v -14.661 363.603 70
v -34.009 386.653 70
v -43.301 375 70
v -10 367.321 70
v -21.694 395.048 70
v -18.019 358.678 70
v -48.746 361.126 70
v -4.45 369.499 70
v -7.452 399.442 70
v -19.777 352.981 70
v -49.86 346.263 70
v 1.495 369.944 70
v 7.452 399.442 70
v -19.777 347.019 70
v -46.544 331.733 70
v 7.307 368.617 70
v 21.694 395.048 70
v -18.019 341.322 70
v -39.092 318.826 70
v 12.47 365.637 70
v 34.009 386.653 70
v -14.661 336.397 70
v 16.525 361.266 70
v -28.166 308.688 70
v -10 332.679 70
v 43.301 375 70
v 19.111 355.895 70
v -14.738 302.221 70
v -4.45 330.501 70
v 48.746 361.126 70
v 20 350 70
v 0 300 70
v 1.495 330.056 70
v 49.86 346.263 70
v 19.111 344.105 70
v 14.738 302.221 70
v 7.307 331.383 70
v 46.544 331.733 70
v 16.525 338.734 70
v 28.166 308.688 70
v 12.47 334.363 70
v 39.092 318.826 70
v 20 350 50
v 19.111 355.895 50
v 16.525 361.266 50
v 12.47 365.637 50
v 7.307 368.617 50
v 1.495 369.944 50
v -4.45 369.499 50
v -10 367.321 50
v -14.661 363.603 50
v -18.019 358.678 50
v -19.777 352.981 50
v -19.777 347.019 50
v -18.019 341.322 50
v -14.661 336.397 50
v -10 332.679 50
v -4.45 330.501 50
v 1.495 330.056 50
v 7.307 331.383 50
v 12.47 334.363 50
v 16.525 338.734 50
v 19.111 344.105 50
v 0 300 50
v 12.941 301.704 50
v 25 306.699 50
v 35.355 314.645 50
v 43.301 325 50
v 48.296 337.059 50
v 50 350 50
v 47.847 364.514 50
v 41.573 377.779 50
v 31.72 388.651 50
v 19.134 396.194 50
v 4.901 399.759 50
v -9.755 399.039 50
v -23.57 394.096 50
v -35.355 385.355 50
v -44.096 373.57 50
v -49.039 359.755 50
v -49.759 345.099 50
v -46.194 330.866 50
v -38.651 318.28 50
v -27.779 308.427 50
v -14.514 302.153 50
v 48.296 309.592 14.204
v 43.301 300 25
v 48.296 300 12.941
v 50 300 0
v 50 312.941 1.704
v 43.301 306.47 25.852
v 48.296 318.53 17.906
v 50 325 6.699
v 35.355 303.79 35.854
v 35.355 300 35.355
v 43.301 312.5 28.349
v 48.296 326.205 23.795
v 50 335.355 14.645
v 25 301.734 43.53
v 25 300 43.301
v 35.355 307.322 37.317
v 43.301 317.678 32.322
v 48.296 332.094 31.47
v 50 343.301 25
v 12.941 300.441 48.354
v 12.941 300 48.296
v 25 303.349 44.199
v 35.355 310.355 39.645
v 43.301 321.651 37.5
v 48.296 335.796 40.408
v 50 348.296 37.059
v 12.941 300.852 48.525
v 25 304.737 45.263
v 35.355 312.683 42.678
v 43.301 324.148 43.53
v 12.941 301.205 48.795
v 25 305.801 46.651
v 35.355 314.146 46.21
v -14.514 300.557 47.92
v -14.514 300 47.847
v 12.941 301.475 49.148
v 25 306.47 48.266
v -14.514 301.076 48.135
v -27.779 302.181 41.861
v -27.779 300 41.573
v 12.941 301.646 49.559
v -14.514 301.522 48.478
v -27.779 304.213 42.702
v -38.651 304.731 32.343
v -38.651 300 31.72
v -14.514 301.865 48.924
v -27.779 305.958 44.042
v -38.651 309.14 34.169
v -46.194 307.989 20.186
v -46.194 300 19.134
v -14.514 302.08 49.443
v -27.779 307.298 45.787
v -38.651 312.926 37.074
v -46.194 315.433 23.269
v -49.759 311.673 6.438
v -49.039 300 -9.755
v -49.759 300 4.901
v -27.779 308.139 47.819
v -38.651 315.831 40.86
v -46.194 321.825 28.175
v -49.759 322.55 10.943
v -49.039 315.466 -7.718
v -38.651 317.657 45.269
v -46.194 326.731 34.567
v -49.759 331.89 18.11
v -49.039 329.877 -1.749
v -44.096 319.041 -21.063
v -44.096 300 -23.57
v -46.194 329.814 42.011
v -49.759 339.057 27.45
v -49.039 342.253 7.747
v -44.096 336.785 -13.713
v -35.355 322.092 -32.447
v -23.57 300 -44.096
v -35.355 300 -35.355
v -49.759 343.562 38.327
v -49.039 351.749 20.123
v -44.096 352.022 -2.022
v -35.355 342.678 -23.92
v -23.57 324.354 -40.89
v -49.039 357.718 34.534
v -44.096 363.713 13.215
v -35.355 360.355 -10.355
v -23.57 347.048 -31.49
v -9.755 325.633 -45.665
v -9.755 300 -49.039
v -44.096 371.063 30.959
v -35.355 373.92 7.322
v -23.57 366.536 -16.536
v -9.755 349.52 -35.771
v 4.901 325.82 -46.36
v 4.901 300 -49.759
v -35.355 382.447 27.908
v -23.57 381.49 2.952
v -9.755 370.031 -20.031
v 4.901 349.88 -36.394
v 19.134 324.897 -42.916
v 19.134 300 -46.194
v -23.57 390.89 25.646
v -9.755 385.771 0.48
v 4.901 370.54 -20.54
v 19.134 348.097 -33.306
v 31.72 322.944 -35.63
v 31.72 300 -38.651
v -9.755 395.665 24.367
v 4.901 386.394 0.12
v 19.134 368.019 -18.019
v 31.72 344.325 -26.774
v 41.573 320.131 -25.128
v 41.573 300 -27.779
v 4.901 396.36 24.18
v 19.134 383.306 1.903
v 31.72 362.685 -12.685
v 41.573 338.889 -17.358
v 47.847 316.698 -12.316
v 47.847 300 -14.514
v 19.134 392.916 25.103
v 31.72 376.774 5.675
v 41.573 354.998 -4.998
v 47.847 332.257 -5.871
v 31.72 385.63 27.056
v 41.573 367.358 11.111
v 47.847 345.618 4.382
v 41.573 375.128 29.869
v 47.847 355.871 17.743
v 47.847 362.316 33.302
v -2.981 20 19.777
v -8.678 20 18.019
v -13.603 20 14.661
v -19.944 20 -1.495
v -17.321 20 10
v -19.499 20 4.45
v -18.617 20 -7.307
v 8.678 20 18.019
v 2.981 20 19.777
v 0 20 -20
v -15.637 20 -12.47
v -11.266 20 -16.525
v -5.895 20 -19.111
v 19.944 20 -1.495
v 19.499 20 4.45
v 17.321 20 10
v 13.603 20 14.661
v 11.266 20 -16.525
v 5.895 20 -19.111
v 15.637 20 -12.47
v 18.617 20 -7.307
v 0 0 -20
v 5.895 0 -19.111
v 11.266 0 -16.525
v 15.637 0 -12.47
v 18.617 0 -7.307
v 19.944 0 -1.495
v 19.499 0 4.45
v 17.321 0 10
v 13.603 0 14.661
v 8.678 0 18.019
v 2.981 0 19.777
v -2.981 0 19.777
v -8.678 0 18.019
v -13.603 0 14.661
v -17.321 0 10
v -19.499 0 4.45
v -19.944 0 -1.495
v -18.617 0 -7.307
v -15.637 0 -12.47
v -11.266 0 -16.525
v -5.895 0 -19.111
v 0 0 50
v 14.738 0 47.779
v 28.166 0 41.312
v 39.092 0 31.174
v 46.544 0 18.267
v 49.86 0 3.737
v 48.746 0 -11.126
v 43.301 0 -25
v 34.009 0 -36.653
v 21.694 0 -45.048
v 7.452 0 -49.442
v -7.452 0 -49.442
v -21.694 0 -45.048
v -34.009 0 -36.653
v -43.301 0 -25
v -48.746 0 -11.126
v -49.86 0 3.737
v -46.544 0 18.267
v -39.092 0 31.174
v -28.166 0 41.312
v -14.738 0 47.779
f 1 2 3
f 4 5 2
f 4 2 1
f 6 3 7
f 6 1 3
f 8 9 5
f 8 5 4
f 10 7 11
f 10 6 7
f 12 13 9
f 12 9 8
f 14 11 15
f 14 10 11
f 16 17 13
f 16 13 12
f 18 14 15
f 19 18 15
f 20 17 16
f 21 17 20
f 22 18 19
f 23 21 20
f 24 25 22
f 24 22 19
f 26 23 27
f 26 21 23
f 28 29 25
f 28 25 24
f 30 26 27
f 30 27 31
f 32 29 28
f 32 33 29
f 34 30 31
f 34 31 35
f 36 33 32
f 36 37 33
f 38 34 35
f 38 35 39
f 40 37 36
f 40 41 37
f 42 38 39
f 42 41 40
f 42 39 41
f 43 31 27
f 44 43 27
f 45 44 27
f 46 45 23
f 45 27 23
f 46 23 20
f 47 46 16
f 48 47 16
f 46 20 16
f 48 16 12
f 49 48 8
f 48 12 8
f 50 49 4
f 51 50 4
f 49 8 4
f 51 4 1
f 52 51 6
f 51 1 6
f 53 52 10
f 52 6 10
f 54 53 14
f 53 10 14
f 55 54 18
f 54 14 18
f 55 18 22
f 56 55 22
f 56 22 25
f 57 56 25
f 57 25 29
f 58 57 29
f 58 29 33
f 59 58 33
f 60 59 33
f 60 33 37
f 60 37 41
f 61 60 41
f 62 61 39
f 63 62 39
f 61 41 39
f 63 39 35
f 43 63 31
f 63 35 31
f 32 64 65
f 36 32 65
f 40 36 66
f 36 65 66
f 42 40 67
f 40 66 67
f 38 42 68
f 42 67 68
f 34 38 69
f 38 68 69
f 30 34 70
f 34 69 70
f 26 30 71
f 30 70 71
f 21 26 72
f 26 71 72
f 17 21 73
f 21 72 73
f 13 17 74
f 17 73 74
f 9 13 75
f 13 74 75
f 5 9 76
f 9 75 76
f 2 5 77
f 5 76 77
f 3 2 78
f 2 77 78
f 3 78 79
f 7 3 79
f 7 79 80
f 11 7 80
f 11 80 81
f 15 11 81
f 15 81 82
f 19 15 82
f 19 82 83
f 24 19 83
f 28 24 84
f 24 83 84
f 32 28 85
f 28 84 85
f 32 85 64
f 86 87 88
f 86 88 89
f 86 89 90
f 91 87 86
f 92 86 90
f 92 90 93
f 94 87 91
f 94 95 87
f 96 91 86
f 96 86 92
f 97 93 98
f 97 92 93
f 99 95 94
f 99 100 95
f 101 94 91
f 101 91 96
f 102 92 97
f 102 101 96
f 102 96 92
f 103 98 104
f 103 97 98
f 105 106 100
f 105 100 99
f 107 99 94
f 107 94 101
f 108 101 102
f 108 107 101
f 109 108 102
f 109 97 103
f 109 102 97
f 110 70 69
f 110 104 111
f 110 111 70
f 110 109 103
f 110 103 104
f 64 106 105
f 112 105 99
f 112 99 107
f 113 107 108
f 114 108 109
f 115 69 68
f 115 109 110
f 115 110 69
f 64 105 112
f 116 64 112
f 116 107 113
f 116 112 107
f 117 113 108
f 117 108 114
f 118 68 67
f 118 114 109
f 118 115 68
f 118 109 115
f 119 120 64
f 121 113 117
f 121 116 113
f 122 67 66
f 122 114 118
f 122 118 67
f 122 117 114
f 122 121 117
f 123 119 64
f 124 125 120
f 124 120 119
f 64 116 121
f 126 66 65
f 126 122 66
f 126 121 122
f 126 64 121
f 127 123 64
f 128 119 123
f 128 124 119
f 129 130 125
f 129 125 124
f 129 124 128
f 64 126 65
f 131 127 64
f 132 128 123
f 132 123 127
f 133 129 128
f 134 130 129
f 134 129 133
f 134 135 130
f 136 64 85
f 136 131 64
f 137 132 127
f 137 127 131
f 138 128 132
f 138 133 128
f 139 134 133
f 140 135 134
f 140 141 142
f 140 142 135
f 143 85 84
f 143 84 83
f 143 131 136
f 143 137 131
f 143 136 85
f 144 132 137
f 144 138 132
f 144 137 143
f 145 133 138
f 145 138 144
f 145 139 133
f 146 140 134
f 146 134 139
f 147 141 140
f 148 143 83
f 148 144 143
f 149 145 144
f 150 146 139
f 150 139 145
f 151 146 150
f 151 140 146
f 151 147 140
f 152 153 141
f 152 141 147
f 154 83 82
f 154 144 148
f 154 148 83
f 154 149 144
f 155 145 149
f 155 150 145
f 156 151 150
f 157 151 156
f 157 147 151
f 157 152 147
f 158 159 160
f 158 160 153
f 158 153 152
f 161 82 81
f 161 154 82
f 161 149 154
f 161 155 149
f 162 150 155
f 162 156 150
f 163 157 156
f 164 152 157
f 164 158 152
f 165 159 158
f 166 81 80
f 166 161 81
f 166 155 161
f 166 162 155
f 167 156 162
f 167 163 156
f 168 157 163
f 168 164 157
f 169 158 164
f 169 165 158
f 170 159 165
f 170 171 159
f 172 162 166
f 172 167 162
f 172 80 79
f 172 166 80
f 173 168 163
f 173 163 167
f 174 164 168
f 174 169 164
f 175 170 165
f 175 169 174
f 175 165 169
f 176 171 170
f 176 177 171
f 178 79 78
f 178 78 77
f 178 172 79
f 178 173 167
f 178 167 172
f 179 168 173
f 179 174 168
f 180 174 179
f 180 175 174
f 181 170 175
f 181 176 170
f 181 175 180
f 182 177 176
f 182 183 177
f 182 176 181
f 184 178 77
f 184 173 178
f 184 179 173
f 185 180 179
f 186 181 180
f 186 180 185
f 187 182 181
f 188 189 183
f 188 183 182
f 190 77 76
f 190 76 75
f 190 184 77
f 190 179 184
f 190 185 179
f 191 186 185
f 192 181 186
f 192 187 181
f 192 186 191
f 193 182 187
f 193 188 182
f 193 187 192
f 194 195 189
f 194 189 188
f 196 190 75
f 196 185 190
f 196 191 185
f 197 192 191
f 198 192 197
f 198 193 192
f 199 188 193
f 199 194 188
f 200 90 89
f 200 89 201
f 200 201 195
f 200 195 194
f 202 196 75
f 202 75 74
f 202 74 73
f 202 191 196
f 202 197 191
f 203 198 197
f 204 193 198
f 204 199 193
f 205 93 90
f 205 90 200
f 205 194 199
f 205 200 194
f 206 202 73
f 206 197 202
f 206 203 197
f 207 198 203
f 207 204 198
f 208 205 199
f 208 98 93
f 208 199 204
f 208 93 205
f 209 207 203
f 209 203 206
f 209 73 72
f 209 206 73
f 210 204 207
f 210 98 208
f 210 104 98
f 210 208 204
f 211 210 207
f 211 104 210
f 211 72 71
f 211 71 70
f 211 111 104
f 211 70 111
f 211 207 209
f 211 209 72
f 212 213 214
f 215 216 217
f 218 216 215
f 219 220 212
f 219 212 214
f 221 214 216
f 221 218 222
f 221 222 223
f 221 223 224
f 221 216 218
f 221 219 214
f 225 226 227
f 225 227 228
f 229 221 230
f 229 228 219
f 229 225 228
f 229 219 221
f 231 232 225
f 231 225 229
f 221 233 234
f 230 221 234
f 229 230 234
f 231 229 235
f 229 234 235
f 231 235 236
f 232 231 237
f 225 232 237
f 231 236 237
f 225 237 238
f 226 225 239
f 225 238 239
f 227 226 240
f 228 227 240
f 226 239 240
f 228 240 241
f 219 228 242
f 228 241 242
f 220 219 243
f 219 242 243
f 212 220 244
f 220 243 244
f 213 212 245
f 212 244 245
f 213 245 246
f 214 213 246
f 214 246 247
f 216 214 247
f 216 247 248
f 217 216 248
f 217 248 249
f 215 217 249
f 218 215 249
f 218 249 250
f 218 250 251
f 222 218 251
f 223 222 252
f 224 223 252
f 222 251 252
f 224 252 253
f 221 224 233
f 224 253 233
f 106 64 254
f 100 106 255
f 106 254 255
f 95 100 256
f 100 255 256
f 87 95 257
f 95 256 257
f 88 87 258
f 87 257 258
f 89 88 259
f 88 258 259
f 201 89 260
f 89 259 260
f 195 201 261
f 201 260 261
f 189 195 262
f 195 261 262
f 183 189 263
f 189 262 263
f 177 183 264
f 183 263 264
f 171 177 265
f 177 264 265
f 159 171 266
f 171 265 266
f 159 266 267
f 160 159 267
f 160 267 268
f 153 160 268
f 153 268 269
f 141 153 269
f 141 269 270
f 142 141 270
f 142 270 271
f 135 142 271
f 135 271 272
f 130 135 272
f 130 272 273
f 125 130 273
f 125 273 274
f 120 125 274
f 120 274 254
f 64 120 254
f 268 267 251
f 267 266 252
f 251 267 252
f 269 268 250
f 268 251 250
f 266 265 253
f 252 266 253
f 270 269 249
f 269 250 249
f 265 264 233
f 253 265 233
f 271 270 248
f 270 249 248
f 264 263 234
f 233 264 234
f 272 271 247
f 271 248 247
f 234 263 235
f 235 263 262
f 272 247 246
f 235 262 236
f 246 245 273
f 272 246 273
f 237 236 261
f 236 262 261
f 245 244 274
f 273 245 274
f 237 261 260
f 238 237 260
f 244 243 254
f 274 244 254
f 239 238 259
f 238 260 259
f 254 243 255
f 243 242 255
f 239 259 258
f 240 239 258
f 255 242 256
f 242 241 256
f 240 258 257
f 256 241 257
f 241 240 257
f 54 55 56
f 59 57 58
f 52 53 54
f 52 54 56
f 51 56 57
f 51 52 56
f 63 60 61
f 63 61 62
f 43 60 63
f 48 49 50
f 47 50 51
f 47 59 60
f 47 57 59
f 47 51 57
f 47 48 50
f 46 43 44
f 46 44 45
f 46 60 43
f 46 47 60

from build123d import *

# Parameters (mm, degrees)
SKETCH1_R           = 50
BOSS_EXTRUDE1_DEPTH = 300
SKETCH3_R           = 50
SKETCH4_R           = 50
BOSS_EXTRUDE2_DEPTH = 20
SKETCH5_R           = 20
CUT_EXTRUDE1_DEPTH  = 20
SKETCH9_R           = 20
CUT_EXTRUDE2_DEPTH  = 20


with BuildPart() as part:
    # Sketch1 → Boss-Extrude1 (new body)
    with BuildSketch(Plane(origin=(0, 0, 0), x_dir=(1, 0, 0), z_dir=(0, 1, 0))):
        with Locations(Location((0, 0, 0), (0, 0, 270))):
            Circle(SKETCH1_R)
    extrude(amount=BOSS_EXTRUDE1_DEPTH)

    # Sweep1: sweep along a path in Sketch2
    with BuildLine(Plane(origin=(0, 0, 0), x_dir=(0, 0, -1), z_dir=(1, 0, 0))) as sweep1_path:
        ThreePointArc((0, 300), (-14.644660941, 335.355339059), (-50, 350))
    # Sketch3 → Sweep1 (sweep)
    with BuildSketch(Plane(origin=(0, 300, 0), x_dir=(1, 0, 0), z_dir=(0, 1, 0))):
        Circle(SKETCH3_R)
    sweep(path=sweep1_path.line)

    # Sketch4 → Boss-Extrude2 (add)
    with BuildSketch(Plane.XY.offset(50)):
        with Locations(Location((0, 350, 0), (0, 0, 270))):
            Circle(SKETCH4_R)
    extrude(amount=BOSS_EXTRUDE2_DEPTH)

    # Sketch5 → Cut-Extrude1 (cut)
    with BuildSketch(Plane.XY.offset(70)):
        with Locations((0, 350)):
            Circle(SKETCH5_R)
    extrude(amount=-CUT_EXTRUDE1_DEPTH, mode=Mode.SUBTRACT)

    # Sketch9 → Cut-Extrude2 (cut)
    with BuildSketch(Plane.XZ):
        with Locations(Location((0, 0, 0), (0, 0, 270))):
            Circle(SKETCH9_R)
    extrude(amount=-CUT_EXTRUDE2_DEPTH, mode=Mode.SUBTRACT)


solid = part.part
